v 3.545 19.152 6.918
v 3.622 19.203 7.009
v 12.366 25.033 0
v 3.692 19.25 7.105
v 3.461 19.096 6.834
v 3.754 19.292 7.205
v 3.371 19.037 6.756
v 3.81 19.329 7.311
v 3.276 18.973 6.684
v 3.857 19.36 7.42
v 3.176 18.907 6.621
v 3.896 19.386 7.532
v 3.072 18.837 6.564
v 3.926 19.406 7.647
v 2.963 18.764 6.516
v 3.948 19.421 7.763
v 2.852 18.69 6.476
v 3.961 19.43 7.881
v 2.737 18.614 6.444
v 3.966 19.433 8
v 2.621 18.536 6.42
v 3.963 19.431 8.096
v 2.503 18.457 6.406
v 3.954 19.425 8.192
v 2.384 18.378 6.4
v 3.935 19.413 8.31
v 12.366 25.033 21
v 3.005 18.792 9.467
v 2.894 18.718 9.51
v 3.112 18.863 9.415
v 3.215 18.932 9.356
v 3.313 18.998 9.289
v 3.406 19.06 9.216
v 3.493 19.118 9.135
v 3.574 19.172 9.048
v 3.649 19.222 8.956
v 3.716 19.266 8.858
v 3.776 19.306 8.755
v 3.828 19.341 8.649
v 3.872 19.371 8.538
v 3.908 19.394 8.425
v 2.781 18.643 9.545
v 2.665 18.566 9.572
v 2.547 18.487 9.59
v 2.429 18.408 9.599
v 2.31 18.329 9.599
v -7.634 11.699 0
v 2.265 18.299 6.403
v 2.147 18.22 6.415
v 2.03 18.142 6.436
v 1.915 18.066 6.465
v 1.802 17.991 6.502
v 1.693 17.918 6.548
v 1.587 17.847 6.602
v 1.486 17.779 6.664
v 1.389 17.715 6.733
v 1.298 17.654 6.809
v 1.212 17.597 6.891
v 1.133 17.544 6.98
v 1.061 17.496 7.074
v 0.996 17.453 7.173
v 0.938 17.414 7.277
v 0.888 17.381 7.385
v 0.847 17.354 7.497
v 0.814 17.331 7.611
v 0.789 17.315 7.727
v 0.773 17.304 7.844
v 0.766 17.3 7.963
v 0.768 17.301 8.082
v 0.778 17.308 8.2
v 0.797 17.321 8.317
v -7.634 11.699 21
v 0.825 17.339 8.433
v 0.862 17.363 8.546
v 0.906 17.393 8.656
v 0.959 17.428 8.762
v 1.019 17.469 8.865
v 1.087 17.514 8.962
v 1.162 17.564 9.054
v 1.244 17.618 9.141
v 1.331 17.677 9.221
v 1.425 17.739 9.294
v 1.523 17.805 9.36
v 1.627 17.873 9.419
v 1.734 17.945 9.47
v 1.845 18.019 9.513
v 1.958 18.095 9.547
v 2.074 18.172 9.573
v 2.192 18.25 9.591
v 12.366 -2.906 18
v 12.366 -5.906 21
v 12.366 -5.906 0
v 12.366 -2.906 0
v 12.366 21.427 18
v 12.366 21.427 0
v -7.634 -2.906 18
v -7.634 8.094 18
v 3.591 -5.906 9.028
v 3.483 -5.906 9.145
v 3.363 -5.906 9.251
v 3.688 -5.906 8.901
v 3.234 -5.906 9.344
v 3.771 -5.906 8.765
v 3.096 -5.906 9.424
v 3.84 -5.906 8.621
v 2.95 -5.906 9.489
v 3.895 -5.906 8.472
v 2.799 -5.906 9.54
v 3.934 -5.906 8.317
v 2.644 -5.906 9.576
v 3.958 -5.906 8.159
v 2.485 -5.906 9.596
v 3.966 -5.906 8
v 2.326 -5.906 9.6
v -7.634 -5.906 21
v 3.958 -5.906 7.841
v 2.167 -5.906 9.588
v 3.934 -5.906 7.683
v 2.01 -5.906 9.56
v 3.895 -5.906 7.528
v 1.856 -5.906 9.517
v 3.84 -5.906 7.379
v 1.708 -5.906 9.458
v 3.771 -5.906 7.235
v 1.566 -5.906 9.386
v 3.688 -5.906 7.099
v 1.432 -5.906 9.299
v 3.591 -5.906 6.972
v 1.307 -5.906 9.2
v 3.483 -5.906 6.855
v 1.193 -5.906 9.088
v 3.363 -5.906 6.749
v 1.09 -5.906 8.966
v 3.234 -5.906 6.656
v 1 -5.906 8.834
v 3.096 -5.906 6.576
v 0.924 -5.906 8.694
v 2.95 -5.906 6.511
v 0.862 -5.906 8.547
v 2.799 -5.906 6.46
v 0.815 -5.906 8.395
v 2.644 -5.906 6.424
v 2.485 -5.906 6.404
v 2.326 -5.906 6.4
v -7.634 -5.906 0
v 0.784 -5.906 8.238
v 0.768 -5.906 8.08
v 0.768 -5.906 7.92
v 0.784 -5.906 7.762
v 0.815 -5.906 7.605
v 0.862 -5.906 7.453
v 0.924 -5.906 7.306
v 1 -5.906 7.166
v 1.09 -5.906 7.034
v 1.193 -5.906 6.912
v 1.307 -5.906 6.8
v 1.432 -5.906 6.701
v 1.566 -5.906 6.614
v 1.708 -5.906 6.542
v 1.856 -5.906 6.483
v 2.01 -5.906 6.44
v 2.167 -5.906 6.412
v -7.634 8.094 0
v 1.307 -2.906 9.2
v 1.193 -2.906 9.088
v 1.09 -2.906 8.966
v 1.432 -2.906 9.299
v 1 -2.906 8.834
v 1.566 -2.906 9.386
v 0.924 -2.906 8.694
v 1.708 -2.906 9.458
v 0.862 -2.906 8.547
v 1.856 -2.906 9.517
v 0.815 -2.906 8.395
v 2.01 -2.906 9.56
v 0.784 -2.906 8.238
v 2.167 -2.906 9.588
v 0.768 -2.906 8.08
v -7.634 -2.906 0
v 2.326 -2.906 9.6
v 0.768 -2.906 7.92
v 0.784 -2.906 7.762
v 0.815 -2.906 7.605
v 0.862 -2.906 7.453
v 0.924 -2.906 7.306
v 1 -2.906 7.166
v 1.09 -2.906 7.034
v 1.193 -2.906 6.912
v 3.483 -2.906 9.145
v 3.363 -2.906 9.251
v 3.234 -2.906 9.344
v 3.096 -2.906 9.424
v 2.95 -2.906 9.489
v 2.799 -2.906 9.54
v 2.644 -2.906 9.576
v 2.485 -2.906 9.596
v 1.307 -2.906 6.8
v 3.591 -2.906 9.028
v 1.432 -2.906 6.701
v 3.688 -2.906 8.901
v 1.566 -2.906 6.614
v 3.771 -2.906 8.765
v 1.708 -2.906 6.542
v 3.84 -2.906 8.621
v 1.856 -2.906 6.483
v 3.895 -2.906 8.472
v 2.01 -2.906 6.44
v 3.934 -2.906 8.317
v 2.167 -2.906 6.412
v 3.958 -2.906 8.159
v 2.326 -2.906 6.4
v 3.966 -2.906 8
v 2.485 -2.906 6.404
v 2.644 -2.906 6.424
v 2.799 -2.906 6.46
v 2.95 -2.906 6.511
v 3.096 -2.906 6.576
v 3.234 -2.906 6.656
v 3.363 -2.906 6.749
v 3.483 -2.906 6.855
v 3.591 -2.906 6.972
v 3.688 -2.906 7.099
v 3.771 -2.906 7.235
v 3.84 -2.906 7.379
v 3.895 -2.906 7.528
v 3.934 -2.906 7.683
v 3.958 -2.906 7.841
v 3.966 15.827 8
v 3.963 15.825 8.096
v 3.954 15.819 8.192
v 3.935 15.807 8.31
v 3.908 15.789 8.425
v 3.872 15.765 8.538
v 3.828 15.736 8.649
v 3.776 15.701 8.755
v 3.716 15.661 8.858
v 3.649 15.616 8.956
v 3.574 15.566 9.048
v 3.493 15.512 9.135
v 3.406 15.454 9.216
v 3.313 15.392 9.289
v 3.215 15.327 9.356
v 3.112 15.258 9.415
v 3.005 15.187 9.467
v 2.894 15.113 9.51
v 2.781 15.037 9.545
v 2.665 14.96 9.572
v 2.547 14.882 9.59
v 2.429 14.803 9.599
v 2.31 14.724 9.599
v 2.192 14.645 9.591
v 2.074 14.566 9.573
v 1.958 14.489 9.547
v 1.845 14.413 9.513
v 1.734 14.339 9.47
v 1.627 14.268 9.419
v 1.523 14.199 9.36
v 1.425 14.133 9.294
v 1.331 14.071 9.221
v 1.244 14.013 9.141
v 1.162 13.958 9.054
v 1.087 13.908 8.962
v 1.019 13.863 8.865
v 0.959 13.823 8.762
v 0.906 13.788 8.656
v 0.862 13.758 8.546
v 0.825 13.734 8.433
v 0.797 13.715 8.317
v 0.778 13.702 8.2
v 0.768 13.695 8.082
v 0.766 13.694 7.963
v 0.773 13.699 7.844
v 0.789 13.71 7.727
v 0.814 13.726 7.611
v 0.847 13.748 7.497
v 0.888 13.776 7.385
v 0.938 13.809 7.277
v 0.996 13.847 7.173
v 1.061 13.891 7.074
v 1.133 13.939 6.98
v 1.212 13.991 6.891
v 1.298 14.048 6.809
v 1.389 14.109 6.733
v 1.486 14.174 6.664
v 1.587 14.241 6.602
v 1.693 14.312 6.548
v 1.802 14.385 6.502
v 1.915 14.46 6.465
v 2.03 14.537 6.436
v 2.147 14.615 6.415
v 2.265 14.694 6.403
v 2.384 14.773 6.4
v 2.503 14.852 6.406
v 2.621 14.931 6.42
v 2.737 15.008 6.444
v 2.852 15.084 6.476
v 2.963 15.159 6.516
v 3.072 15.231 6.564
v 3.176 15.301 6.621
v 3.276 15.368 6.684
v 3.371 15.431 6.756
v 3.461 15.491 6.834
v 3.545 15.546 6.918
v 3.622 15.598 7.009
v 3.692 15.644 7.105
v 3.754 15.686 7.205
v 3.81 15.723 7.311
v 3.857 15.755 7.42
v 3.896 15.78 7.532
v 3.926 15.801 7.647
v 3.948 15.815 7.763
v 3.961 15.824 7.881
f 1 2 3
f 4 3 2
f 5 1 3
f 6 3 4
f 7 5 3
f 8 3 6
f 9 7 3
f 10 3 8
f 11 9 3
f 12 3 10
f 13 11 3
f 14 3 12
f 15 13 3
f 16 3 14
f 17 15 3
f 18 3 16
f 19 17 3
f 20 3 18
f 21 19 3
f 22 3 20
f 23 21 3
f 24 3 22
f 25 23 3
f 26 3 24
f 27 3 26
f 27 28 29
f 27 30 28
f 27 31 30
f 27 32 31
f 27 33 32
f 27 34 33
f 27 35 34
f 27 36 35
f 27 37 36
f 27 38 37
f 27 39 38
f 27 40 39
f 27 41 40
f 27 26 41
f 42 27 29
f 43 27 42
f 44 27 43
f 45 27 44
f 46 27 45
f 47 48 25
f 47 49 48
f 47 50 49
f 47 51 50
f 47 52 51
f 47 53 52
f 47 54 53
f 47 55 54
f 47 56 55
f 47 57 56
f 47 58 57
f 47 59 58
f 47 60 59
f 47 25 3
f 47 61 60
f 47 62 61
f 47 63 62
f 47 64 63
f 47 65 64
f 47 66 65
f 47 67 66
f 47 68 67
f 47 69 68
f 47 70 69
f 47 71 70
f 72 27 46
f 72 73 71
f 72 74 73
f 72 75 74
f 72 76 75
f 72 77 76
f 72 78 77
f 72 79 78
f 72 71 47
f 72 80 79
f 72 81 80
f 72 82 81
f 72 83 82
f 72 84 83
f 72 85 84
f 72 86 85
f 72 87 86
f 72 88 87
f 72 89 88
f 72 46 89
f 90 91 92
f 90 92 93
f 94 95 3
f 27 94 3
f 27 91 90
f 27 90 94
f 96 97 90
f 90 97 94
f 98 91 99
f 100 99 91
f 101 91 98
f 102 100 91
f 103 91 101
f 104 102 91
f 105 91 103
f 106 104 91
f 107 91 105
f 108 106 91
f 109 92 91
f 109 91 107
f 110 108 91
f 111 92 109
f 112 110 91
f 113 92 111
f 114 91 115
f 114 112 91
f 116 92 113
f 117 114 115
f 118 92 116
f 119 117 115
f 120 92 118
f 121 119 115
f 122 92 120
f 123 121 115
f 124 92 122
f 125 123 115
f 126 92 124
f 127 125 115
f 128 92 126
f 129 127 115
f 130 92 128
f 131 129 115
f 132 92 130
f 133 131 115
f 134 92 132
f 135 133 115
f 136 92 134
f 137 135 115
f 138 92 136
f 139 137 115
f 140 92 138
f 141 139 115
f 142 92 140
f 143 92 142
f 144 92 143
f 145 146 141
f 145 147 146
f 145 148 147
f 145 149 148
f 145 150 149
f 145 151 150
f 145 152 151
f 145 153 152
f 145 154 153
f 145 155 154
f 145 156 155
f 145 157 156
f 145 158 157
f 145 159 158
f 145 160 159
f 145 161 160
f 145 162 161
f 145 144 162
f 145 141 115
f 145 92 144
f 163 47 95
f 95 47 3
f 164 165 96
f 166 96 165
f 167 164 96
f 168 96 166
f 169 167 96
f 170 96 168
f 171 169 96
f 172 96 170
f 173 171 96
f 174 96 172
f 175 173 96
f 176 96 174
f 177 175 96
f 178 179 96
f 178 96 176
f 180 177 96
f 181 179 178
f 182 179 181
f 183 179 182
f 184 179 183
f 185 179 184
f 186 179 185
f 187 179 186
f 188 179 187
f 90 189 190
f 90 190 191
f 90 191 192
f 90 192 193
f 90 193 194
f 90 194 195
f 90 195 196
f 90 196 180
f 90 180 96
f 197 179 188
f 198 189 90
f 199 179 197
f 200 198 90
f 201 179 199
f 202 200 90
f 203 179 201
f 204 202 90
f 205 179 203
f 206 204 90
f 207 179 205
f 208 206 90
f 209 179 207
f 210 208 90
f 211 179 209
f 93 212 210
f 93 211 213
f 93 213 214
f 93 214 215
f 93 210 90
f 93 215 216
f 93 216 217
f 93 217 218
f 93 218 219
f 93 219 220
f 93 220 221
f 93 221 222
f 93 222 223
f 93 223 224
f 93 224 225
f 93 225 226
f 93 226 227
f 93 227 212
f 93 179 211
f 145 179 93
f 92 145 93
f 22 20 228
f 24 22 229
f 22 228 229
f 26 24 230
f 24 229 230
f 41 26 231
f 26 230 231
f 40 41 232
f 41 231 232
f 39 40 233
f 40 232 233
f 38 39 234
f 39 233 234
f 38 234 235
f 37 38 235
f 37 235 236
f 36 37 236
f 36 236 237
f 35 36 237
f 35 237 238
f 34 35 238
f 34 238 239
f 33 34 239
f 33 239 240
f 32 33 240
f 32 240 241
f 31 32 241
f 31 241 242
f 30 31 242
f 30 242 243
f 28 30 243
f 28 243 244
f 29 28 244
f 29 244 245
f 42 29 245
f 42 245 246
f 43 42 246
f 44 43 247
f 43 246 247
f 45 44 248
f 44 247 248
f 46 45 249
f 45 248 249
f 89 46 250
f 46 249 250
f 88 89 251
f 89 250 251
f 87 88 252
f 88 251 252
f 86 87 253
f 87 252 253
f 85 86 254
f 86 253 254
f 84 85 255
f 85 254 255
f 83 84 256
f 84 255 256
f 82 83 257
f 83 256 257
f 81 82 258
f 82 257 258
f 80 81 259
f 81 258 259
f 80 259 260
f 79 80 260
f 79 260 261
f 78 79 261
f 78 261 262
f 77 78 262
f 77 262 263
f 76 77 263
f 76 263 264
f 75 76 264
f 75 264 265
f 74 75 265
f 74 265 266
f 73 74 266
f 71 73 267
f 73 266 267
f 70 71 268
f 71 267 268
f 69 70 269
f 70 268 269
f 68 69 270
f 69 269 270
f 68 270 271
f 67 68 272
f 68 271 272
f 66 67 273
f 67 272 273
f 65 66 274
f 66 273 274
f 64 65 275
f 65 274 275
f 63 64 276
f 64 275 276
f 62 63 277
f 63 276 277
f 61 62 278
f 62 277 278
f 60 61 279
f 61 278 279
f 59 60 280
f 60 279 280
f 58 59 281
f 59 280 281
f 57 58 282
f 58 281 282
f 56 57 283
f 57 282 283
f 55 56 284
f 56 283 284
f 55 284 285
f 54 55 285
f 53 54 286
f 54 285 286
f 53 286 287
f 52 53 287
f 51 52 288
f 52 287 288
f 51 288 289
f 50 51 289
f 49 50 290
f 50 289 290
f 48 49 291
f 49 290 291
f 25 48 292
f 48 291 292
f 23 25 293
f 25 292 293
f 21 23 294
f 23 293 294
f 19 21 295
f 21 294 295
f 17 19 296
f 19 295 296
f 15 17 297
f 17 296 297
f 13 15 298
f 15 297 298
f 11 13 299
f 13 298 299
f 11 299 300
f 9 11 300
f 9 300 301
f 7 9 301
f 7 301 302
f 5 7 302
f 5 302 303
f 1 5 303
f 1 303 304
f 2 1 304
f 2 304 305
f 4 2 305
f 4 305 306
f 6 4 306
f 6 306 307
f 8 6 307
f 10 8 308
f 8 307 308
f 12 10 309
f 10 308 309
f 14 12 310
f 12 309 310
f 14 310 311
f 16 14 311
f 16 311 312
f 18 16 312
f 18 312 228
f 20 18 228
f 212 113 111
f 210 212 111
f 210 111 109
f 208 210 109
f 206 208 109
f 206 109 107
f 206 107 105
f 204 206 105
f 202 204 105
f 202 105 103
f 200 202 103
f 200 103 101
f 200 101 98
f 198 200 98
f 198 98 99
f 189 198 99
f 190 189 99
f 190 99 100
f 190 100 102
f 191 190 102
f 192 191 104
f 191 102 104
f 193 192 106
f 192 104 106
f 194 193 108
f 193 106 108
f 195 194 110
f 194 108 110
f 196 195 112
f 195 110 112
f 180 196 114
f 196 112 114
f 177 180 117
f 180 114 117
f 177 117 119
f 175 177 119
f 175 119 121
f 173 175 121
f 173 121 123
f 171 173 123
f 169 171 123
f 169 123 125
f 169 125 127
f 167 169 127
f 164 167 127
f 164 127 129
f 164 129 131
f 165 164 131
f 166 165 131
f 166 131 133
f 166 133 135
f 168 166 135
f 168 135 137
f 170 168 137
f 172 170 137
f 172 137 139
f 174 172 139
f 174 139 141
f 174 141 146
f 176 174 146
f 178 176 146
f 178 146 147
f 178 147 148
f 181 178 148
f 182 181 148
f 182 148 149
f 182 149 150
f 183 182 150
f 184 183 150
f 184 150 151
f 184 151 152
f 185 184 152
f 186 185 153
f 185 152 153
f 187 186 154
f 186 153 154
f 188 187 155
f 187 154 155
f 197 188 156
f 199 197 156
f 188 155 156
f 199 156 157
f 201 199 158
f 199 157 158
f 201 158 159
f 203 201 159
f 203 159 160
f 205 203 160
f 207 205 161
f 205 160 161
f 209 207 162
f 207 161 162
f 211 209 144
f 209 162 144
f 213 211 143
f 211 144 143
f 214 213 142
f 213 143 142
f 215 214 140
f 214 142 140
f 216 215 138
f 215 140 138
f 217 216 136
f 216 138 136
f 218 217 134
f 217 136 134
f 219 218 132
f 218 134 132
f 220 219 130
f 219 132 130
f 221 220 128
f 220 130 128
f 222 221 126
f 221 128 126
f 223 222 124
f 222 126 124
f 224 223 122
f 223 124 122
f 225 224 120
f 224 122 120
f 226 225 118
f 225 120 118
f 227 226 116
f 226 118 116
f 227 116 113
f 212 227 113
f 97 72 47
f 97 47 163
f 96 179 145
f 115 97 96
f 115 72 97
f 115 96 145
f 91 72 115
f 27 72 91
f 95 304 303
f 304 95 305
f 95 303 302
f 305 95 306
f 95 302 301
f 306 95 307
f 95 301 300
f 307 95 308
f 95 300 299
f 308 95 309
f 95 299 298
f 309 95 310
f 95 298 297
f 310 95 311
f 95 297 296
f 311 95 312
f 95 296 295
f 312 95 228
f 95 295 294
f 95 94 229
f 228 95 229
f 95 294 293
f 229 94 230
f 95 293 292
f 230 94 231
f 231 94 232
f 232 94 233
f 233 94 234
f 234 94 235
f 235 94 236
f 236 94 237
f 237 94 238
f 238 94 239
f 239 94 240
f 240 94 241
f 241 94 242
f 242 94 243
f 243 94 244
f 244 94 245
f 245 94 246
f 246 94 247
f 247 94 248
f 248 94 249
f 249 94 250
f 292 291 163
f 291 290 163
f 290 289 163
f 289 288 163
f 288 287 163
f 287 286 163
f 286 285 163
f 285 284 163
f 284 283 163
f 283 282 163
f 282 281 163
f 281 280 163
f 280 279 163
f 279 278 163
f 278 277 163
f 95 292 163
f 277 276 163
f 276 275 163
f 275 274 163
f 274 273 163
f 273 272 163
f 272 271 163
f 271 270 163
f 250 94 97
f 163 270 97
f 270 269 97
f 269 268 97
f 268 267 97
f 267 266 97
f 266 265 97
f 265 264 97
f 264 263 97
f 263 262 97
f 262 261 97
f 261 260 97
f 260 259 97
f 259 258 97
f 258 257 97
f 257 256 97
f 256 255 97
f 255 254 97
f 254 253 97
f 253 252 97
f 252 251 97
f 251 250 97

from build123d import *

# Parameters (mm, degrees)
EXTRUDE_1_DEPTH      = 3
SKETCH_2_W           = 20
SKETCH_2_H           = 3
EXTRUDE_2_DEPTH      = 18
EXTRUDE_2_DEPTH_BACK = 3
SKETCH_5_R           = 1.6
CUT_EXTRUDE_1_DEPTH  = 31.938884609
CUT_EXTRUDE_2_DEPTH  = 4
EXTRUDE_3_DEPTH      = 3


with BuildPart() as part:
    # 草图1 → 凸台-拉伸1 (new body)
    with BuildSketch(Plane.XY):
        Polygon((-7.634327041, -2.906141593), (-7.634327041, 8.093858407), (12.365672959, 21.427191741), (12.365672959, -5.906141593), (-7.634327041, -5.906141593), align=None)
    extrude(amount=EXTRUDE_1_DEPTH)

    # 草图2 → 凸台-拉伸2 (add, two sides)
    with BuildSketch(Plane.XY.offset(3)) as extrude_2_sk:
        Polygon((-7.634327041, 8.093858407), (12.365672959, 21.427191741), (12.365672959, 25.032743016), (-7.634327041, 11.699409683), align=None)
        with Locations((2.365672959, -4.406141593)):
            Rectangle(SKETCH_2_W, SKETCH_2_H)
    extrude(amount=EXTRUDE_2_DEPTH)
    extrude(extrude_2_sk.sketch, amount=-EXTRUDE_2_DEPTH_BACK)

    # 草图5 → 切除-拉伸1 (cut, through all)
    with BuildSketch(Plane.XZ.offset(5.906141593)):
        with Locations((2.365672959, 8)):
            Circle(SKETCH_5_R)
    extrude(amount=-CUT_EXTRUDE_1_DEPTH, mode=Mode.SUBTRACT)

    # 草图6 → 切除-拉伸2 (cut, through all)
    with BuildSketch(Plane.XY.offset(3)):
        Polygon((-7.634327041, 8.093858407), (-7.634327041, -2.906141593), (12.365672959, -2.906141593), (12.365672959, 21.427191741), align=None)
    extrude(amount=-CUT_EXTRUDE_2_DEPTH, mode=Mode.SUBTRACT)

    # 草图7 → 凸台-拉伸3 (add)
    with BuildSketch(Plane.XY.offset(21)):
        Polygon((-7.634327041, 11.699409683), (-7.634327041, -5.906141593), (12.365672959, -5.906141593), (12.365672959, 25.032743016), align=None)
    extrude(amount=-EXTRUDE_3_DEPTH)


solid = part.part
